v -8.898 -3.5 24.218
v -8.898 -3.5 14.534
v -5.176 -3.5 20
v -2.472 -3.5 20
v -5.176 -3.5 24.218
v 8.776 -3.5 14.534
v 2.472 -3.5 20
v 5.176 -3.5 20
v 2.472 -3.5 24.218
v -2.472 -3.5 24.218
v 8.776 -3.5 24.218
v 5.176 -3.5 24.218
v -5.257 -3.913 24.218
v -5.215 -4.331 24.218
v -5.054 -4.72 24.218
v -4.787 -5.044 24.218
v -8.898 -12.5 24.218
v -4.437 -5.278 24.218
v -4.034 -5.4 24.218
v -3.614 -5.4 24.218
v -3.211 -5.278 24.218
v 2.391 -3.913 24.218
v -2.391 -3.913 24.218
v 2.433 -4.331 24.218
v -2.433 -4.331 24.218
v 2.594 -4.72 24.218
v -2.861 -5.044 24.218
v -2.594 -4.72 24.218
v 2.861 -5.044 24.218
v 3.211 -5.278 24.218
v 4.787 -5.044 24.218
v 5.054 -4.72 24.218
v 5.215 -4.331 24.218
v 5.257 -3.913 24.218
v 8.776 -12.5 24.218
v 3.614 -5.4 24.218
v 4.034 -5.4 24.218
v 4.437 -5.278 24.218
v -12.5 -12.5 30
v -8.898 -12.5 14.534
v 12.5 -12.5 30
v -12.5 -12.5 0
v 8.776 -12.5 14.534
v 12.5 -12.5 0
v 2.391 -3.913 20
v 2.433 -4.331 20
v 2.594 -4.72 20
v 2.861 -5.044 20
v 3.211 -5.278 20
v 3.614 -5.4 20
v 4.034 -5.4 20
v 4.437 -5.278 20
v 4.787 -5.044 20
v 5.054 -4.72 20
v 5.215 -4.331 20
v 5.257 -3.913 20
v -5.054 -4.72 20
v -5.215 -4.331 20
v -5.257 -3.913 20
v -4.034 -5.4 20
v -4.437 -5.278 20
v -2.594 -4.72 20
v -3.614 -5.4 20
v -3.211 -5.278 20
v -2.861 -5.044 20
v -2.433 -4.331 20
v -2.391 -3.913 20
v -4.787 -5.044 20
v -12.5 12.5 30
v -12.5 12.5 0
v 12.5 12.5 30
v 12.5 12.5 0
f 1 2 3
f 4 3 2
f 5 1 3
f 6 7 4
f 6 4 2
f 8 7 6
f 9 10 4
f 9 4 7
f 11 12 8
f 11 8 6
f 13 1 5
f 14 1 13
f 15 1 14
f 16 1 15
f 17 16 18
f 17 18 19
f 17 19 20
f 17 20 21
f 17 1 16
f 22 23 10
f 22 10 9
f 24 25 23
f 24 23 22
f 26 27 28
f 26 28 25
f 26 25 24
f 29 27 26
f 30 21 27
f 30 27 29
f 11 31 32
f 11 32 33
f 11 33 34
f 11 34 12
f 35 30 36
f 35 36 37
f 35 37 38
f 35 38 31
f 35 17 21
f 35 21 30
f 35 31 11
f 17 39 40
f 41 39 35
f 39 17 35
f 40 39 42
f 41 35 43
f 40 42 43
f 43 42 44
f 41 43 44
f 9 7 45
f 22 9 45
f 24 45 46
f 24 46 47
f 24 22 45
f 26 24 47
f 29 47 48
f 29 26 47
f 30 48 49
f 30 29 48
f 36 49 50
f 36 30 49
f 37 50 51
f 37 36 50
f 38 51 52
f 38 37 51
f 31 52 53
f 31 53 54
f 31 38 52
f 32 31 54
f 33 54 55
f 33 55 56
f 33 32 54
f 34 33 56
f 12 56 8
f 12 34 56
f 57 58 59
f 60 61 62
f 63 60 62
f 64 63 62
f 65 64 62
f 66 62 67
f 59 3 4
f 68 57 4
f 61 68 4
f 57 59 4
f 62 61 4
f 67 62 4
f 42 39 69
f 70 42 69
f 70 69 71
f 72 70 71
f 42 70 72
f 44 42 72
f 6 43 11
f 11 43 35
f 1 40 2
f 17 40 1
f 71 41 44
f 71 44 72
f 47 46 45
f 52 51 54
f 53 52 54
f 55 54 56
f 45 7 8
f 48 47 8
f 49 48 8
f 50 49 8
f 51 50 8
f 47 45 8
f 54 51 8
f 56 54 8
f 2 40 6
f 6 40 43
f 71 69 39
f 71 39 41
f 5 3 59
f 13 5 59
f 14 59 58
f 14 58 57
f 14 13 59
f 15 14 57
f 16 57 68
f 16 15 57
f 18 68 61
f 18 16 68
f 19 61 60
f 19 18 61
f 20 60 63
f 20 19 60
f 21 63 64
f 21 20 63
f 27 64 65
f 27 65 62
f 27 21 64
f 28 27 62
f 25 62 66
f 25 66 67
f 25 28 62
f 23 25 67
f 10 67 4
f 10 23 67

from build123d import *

# Parameters (mm, degrees)
F0_W     = 25
F0_H     = 25
F2_DEPTH = 30
F3_W     = 17.673826
F3_H     = 9.68429
F4_DEPTH = 9
F5_R     = 1.434881
F6_DEPTH = 10


with BuildPart() as f2:
    # F0 (on Top) → F2 (new body)
    with BuildSketch(Plane.XY):
        Rectangle(F0_W, F0_H)
    extrude(amount=F2_DEPTH)

    # F3 (on face) → F4 (cut)
    with BuildSketch(Plane.XZ.offset(12.5)):
        with Locations((-0.060834, 19.375956)):
            Rectangle(F3_W, F3_H)
    extrude(amount=-F4_DEPTH, mode=Mode.SUBTRACT)

    # F5 (on offset) → F6 (join)
    with BuildSketch(Plane.XY.offset(30)):
        with Locations((-3.82385, -3.980379)):
            Circle(F5_R)
        with Locations((3.82385, -3.980379)):
            Circle(F5_R)
    extrude(amount=-F6_DEPTH)


solid = f2.part
